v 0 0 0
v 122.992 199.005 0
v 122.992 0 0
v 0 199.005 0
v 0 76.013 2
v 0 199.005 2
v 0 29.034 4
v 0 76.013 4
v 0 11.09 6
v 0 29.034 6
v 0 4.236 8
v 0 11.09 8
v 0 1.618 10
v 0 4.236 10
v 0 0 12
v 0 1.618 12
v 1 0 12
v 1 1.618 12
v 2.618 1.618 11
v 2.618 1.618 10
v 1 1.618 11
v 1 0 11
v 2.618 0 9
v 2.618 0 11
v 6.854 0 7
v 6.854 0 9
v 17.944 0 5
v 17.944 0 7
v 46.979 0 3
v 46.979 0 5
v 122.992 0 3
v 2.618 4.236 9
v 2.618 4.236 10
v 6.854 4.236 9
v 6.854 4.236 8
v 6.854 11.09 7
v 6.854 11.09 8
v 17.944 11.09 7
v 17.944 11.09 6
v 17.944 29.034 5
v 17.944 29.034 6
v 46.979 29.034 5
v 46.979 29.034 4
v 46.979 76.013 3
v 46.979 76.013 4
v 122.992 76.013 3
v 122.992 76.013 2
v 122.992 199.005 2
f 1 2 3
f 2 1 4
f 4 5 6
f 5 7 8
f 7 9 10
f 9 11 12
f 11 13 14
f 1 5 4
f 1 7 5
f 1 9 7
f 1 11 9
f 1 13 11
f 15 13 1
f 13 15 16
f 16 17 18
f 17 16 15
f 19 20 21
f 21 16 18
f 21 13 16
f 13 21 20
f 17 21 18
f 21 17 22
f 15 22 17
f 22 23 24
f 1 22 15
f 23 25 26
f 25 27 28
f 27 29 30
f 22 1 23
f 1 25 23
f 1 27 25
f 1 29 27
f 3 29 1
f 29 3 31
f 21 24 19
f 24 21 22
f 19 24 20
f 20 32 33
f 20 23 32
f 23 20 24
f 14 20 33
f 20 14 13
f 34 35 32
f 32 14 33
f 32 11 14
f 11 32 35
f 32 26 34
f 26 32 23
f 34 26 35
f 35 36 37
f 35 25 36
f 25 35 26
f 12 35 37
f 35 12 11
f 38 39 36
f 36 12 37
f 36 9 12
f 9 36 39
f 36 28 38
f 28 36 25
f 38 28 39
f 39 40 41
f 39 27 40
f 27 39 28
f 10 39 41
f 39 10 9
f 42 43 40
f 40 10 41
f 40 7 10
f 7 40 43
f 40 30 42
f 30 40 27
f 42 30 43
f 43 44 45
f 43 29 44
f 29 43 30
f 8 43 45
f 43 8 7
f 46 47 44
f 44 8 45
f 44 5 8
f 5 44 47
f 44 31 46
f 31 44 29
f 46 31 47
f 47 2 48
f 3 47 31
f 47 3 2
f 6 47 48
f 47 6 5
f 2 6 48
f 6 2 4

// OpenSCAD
// file golden_ratio.scad
// Creates successive rectangles whose smallest side is the large side of 
// the next rectangle. Rectangle sides in ratio of phi to each other
// (c) 2020 Rich Cameron
// released under a Creative Commons CC-BY 4.0 International License
phi = (1 + sqrt(5)) / 2;

for(i = [0:10]) rotate(i * 0) mirror((i % 2) * [1, -1, 0]) linear_extrude(12 - i) square(pow(phi, i) * [1, phi]);
